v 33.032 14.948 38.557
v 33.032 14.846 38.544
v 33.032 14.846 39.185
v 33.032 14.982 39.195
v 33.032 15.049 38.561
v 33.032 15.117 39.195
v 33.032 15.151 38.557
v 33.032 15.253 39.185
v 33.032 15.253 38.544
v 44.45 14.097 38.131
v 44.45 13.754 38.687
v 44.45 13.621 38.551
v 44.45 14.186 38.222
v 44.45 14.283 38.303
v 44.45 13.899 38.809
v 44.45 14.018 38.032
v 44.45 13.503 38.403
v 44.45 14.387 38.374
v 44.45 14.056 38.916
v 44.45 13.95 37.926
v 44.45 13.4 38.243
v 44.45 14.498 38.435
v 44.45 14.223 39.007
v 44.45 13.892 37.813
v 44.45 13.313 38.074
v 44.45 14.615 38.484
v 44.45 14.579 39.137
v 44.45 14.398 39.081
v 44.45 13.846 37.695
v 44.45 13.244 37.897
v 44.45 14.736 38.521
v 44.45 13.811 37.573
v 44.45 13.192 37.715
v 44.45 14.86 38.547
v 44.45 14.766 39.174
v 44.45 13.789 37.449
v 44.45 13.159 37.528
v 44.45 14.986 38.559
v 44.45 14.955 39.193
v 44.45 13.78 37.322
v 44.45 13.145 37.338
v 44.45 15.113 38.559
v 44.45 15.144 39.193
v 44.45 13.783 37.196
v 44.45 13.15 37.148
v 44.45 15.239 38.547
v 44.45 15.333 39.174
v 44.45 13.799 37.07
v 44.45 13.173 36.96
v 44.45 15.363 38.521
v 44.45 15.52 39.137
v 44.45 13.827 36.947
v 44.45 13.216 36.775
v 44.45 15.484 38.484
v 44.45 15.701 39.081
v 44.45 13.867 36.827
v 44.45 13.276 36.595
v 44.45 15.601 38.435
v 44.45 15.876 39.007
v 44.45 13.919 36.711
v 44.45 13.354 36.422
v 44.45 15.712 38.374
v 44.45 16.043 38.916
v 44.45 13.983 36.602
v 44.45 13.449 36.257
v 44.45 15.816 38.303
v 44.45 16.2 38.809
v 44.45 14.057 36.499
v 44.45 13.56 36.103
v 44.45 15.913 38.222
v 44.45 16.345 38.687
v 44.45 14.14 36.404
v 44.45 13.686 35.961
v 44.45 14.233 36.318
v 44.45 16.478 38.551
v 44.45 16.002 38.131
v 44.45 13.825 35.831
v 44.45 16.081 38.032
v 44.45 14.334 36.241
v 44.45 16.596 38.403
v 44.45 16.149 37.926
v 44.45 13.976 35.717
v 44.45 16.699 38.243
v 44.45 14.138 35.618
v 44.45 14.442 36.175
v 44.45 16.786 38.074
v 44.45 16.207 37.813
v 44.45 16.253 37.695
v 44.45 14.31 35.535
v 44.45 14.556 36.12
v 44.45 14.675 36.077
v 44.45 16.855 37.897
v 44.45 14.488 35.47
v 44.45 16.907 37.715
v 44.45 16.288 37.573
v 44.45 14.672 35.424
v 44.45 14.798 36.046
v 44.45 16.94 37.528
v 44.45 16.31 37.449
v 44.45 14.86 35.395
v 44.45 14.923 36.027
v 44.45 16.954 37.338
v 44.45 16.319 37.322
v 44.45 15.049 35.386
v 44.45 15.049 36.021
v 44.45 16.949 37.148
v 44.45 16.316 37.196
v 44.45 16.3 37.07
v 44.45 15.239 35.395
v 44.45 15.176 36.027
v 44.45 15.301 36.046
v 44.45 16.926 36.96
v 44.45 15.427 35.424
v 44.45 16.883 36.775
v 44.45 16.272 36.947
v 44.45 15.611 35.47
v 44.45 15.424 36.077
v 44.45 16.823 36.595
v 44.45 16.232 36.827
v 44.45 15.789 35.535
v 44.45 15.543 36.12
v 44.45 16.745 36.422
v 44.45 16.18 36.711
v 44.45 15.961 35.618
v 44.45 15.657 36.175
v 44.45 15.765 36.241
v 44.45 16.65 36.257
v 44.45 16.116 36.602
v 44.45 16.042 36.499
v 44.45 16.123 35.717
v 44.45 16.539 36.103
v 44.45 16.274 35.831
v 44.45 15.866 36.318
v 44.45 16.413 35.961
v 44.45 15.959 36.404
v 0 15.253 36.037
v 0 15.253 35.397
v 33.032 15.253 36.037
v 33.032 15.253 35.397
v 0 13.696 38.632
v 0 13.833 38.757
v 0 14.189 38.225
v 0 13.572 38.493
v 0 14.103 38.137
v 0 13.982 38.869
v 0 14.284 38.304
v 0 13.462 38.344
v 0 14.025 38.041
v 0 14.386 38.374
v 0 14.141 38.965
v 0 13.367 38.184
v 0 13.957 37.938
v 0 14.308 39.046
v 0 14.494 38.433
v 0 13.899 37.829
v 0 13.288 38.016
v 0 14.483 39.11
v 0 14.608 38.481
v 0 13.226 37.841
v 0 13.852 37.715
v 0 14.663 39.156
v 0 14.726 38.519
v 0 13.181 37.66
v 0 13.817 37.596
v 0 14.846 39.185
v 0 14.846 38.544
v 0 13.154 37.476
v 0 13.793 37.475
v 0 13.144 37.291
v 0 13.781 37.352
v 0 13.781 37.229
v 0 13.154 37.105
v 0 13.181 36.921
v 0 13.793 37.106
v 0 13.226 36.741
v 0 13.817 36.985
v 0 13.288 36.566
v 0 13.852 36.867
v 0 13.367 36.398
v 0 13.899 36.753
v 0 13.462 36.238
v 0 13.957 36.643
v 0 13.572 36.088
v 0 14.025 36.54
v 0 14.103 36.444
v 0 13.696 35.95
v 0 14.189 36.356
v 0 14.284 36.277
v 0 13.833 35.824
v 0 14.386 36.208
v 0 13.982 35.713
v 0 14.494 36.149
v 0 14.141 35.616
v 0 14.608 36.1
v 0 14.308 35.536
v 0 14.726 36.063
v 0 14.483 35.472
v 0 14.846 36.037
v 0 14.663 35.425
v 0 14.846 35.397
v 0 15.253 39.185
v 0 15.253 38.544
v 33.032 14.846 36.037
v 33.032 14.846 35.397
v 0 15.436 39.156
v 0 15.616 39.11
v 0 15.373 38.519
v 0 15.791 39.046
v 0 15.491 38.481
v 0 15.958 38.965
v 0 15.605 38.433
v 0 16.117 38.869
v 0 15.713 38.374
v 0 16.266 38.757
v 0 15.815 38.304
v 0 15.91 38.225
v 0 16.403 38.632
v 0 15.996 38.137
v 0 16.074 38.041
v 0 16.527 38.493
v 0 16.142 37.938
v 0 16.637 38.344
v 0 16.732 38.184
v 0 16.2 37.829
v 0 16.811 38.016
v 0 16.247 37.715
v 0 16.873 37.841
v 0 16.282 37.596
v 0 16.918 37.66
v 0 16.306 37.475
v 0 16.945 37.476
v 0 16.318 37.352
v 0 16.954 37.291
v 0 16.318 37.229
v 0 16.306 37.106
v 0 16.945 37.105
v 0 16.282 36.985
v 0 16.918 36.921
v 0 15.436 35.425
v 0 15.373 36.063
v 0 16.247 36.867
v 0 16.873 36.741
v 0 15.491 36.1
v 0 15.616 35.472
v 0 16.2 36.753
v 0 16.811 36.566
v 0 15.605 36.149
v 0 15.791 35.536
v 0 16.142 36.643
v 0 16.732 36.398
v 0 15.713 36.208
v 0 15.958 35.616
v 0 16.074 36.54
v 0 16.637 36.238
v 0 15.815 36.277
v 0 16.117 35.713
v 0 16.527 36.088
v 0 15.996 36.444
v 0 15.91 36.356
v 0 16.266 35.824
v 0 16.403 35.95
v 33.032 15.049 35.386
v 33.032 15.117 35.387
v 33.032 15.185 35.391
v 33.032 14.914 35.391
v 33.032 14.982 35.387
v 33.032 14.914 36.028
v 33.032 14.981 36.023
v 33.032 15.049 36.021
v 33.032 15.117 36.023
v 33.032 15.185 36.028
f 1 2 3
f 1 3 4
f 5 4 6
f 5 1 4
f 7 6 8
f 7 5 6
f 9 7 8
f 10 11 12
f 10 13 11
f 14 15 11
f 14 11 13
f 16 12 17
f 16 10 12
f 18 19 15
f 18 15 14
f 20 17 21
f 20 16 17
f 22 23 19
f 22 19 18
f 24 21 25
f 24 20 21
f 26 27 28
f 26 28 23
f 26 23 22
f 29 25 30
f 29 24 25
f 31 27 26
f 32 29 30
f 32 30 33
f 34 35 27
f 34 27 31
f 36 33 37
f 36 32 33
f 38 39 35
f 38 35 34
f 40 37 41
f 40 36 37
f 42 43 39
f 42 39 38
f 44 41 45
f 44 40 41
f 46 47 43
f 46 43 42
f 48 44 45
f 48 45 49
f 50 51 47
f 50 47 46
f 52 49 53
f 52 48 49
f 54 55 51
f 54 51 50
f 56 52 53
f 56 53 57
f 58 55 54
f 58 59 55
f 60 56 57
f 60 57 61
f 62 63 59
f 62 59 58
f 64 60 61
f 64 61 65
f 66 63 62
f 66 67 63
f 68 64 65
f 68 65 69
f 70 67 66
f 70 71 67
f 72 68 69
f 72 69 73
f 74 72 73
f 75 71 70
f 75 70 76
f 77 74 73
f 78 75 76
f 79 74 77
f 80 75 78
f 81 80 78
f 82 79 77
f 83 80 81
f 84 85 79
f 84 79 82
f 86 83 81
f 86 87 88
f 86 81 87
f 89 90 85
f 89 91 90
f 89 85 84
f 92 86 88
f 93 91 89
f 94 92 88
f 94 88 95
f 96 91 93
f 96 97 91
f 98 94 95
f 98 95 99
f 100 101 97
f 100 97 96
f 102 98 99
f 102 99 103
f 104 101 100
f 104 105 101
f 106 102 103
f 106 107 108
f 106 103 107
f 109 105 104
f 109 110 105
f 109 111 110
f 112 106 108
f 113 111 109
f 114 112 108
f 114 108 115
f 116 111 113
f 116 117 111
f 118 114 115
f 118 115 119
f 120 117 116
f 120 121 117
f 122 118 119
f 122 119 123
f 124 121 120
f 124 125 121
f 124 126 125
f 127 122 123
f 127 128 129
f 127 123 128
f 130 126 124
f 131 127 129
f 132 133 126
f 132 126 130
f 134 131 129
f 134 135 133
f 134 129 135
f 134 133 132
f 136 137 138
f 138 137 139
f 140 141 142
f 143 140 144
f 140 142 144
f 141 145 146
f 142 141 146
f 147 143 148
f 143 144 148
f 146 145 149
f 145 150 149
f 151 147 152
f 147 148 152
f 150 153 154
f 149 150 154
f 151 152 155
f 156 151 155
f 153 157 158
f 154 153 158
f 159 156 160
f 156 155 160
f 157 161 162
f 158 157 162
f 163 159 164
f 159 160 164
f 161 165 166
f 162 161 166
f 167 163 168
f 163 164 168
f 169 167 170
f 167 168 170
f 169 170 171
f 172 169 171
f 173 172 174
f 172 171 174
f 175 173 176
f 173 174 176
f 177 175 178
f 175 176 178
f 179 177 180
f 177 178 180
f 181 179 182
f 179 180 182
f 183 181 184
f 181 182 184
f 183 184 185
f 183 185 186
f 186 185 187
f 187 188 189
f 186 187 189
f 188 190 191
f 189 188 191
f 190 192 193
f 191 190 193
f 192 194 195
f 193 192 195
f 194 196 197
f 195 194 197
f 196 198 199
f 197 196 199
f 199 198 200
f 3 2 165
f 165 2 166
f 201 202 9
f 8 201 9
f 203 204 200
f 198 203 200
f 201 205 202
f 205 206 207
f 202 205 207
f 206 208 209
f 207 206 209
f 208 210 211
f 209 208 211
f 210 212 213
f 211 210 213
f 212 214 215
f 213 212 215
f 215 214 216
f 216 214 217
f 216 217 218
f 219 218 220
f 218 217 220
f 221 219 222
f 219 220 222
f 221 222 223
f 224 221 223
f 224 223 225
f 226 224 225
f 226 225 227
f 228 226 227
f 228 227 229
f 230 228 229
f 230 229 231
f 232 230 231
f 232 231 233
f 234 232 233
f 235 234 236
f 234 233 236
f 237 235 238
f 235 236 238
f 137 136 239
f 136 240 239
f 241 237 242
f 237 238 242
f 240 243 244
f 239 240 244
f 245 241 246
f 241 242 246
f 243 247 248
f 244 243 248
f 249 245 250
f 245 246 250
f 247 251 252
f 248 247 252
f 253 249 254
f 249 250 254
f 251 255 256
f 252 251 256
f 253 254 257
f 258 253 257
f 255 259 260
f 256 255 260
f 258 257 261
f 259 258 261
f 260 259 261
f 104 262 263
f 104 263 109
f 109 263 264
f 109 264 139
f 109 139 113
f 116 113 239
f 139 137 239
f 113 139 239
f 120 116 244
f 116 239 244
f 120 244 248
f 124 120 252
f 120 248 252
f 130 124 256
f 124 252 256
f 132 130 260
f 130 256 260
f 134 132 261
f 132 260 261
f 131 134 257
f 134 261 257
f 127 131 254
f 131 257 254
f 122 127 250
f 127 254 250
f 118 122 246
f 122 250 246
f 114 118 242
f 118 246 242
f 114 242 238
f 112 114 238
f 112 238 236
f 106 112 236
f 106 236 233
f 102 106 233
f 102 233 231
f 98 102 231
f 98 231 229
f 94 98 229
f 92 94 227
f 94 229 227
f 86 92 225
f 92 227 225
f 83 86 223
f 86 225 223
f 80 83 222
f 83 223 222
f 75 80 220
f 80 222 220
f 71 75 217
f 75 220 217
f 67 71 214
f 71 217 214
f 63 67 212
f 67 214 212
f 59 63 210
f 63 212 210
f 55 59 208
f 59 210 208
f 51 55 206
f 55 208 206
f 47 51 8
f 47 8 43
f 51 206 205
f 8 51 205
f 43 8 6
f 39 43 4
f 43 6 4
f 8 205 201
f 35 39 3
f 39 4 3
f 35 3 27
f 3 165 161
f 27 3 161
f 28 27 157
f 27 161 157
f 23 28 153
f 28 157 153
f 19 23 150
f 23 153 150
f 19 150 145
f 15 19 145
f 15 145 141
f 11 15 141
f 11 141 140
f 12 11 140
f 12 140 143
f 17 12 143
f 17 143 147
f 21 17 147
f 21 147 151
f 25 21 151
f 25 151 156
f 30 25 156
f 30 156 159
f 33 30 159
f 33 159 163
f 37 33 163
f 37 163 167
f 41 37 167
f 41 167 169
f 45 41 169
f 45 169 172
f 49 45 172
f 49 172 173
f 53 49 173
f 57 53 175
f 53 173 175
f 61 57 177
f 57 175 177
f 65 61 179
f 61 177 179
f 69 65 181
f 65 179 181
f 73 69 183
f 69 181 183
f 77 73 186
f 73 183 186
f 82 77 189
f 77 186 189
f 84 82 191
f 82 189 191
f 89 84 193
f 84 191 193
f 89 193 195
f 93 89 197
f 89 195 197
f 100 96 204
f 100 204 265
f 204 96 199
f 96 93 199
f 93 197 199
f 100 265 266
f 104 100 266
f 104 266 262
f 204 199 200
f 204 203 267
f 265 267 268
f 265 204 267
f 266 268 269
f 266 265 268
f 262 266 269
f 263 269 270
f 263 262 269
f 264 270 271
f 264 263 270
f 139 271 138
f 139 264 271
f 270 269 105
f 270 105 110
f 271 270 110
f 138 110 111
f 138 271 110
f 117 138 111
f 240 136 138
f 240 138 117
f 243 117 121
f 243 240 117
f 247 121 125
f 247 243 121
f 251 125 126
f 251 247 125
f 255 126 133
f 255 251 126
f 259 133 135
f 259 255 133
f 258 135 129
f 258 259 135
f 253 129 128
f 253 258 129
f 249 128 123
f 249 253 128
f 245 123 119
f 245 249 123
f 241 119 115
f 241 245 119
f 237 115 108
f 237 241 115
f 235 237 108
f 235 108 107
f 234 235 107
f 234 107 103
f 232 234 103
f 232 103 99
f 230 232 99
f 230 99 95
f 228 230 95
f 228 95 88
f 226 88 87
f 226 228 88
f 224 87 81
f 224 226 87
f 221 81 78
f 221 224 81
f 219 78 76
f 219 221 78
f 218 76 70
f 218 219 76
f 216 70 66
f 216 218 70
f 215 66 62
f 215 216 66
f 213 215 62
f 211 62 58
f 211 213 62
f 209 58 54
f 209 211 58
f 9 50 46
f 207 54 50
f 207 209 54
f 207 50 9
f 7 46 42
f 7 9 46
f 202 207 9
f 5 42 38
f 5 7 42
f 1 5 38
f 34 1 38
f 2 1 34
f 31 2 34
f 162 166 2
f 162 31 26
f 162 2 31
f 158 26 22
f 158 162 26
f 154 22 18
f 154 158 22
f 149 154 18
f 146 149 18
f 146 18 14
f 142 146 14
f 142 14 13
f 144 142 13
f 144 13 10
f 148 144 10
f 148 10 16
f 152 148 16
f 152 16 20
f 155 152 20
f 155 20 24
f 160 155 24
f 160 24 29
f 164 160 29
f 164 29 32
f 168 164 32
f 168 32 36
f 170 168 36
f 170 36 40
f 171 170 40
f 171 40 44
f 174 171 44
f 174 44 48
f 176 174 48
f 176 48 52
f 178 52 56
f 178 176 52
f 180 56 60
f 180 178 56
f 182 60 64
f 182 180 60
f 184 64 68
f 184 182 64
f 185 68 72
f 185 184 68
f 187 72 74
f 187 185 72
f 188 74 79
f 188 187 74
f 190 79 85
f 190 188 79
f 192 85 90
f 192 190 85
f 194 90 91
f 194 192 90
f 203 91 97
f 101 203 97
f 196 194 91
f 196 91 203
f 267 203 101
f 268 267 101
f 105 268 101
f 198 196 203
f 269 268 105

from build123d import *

# Parameters (mm, degrees)
SKETCH1_R               = 1.905
SKETCH1_R_2             = 1.27
BOSS_EXTRUDE1_DEPTH     = 44.45
CUT_EXTRUDE6_DEPTH      = 8.382
CUT_EXTRUDE6_DEPTH_BACK = 6.858


with BuildPart() as part:
    # Sketch1 → Boss-Extrude1 (new body)
    with BuildSketch(Plane(origin=(0, 0, 0), x_dir=(0, 0, -1), z_dir=(1, 0, 0))):
        with Locations((-37.290755903, 15.049483632)):
            Circle(SKETCH1_R)
        with Locations((-37.290755903, 15.049483632)):
            Circle(SKETCH1_R_2, mode=Mode.SUBTRACT)
    extrude(amount=BOSS_EXTRUDE1_DEPTH)

    # Sketch10 → Cut-Extrude6 (cut, two sides: drawn at the far end of the back side and taken through both)
    with BuildSketch(Plane.XY.offset(39.195755903).offset(-CUT_EXTRUDE6_DEPTH_BACK)):
        Polygon((0, 15.049483632), (0, 15.252683632), (33.032460862, 15.252683632), (33.032460862, 15.007269714), (33.032460862, 14.846283632), (0, 14.846283632), align=None)
    extrude(amount=CUT_EXTRUDE6_DEPTH + CUT_EXTRUDE6_DEPTH_BACK, mode=Mode.SUBTRACT)


solid = part.part
